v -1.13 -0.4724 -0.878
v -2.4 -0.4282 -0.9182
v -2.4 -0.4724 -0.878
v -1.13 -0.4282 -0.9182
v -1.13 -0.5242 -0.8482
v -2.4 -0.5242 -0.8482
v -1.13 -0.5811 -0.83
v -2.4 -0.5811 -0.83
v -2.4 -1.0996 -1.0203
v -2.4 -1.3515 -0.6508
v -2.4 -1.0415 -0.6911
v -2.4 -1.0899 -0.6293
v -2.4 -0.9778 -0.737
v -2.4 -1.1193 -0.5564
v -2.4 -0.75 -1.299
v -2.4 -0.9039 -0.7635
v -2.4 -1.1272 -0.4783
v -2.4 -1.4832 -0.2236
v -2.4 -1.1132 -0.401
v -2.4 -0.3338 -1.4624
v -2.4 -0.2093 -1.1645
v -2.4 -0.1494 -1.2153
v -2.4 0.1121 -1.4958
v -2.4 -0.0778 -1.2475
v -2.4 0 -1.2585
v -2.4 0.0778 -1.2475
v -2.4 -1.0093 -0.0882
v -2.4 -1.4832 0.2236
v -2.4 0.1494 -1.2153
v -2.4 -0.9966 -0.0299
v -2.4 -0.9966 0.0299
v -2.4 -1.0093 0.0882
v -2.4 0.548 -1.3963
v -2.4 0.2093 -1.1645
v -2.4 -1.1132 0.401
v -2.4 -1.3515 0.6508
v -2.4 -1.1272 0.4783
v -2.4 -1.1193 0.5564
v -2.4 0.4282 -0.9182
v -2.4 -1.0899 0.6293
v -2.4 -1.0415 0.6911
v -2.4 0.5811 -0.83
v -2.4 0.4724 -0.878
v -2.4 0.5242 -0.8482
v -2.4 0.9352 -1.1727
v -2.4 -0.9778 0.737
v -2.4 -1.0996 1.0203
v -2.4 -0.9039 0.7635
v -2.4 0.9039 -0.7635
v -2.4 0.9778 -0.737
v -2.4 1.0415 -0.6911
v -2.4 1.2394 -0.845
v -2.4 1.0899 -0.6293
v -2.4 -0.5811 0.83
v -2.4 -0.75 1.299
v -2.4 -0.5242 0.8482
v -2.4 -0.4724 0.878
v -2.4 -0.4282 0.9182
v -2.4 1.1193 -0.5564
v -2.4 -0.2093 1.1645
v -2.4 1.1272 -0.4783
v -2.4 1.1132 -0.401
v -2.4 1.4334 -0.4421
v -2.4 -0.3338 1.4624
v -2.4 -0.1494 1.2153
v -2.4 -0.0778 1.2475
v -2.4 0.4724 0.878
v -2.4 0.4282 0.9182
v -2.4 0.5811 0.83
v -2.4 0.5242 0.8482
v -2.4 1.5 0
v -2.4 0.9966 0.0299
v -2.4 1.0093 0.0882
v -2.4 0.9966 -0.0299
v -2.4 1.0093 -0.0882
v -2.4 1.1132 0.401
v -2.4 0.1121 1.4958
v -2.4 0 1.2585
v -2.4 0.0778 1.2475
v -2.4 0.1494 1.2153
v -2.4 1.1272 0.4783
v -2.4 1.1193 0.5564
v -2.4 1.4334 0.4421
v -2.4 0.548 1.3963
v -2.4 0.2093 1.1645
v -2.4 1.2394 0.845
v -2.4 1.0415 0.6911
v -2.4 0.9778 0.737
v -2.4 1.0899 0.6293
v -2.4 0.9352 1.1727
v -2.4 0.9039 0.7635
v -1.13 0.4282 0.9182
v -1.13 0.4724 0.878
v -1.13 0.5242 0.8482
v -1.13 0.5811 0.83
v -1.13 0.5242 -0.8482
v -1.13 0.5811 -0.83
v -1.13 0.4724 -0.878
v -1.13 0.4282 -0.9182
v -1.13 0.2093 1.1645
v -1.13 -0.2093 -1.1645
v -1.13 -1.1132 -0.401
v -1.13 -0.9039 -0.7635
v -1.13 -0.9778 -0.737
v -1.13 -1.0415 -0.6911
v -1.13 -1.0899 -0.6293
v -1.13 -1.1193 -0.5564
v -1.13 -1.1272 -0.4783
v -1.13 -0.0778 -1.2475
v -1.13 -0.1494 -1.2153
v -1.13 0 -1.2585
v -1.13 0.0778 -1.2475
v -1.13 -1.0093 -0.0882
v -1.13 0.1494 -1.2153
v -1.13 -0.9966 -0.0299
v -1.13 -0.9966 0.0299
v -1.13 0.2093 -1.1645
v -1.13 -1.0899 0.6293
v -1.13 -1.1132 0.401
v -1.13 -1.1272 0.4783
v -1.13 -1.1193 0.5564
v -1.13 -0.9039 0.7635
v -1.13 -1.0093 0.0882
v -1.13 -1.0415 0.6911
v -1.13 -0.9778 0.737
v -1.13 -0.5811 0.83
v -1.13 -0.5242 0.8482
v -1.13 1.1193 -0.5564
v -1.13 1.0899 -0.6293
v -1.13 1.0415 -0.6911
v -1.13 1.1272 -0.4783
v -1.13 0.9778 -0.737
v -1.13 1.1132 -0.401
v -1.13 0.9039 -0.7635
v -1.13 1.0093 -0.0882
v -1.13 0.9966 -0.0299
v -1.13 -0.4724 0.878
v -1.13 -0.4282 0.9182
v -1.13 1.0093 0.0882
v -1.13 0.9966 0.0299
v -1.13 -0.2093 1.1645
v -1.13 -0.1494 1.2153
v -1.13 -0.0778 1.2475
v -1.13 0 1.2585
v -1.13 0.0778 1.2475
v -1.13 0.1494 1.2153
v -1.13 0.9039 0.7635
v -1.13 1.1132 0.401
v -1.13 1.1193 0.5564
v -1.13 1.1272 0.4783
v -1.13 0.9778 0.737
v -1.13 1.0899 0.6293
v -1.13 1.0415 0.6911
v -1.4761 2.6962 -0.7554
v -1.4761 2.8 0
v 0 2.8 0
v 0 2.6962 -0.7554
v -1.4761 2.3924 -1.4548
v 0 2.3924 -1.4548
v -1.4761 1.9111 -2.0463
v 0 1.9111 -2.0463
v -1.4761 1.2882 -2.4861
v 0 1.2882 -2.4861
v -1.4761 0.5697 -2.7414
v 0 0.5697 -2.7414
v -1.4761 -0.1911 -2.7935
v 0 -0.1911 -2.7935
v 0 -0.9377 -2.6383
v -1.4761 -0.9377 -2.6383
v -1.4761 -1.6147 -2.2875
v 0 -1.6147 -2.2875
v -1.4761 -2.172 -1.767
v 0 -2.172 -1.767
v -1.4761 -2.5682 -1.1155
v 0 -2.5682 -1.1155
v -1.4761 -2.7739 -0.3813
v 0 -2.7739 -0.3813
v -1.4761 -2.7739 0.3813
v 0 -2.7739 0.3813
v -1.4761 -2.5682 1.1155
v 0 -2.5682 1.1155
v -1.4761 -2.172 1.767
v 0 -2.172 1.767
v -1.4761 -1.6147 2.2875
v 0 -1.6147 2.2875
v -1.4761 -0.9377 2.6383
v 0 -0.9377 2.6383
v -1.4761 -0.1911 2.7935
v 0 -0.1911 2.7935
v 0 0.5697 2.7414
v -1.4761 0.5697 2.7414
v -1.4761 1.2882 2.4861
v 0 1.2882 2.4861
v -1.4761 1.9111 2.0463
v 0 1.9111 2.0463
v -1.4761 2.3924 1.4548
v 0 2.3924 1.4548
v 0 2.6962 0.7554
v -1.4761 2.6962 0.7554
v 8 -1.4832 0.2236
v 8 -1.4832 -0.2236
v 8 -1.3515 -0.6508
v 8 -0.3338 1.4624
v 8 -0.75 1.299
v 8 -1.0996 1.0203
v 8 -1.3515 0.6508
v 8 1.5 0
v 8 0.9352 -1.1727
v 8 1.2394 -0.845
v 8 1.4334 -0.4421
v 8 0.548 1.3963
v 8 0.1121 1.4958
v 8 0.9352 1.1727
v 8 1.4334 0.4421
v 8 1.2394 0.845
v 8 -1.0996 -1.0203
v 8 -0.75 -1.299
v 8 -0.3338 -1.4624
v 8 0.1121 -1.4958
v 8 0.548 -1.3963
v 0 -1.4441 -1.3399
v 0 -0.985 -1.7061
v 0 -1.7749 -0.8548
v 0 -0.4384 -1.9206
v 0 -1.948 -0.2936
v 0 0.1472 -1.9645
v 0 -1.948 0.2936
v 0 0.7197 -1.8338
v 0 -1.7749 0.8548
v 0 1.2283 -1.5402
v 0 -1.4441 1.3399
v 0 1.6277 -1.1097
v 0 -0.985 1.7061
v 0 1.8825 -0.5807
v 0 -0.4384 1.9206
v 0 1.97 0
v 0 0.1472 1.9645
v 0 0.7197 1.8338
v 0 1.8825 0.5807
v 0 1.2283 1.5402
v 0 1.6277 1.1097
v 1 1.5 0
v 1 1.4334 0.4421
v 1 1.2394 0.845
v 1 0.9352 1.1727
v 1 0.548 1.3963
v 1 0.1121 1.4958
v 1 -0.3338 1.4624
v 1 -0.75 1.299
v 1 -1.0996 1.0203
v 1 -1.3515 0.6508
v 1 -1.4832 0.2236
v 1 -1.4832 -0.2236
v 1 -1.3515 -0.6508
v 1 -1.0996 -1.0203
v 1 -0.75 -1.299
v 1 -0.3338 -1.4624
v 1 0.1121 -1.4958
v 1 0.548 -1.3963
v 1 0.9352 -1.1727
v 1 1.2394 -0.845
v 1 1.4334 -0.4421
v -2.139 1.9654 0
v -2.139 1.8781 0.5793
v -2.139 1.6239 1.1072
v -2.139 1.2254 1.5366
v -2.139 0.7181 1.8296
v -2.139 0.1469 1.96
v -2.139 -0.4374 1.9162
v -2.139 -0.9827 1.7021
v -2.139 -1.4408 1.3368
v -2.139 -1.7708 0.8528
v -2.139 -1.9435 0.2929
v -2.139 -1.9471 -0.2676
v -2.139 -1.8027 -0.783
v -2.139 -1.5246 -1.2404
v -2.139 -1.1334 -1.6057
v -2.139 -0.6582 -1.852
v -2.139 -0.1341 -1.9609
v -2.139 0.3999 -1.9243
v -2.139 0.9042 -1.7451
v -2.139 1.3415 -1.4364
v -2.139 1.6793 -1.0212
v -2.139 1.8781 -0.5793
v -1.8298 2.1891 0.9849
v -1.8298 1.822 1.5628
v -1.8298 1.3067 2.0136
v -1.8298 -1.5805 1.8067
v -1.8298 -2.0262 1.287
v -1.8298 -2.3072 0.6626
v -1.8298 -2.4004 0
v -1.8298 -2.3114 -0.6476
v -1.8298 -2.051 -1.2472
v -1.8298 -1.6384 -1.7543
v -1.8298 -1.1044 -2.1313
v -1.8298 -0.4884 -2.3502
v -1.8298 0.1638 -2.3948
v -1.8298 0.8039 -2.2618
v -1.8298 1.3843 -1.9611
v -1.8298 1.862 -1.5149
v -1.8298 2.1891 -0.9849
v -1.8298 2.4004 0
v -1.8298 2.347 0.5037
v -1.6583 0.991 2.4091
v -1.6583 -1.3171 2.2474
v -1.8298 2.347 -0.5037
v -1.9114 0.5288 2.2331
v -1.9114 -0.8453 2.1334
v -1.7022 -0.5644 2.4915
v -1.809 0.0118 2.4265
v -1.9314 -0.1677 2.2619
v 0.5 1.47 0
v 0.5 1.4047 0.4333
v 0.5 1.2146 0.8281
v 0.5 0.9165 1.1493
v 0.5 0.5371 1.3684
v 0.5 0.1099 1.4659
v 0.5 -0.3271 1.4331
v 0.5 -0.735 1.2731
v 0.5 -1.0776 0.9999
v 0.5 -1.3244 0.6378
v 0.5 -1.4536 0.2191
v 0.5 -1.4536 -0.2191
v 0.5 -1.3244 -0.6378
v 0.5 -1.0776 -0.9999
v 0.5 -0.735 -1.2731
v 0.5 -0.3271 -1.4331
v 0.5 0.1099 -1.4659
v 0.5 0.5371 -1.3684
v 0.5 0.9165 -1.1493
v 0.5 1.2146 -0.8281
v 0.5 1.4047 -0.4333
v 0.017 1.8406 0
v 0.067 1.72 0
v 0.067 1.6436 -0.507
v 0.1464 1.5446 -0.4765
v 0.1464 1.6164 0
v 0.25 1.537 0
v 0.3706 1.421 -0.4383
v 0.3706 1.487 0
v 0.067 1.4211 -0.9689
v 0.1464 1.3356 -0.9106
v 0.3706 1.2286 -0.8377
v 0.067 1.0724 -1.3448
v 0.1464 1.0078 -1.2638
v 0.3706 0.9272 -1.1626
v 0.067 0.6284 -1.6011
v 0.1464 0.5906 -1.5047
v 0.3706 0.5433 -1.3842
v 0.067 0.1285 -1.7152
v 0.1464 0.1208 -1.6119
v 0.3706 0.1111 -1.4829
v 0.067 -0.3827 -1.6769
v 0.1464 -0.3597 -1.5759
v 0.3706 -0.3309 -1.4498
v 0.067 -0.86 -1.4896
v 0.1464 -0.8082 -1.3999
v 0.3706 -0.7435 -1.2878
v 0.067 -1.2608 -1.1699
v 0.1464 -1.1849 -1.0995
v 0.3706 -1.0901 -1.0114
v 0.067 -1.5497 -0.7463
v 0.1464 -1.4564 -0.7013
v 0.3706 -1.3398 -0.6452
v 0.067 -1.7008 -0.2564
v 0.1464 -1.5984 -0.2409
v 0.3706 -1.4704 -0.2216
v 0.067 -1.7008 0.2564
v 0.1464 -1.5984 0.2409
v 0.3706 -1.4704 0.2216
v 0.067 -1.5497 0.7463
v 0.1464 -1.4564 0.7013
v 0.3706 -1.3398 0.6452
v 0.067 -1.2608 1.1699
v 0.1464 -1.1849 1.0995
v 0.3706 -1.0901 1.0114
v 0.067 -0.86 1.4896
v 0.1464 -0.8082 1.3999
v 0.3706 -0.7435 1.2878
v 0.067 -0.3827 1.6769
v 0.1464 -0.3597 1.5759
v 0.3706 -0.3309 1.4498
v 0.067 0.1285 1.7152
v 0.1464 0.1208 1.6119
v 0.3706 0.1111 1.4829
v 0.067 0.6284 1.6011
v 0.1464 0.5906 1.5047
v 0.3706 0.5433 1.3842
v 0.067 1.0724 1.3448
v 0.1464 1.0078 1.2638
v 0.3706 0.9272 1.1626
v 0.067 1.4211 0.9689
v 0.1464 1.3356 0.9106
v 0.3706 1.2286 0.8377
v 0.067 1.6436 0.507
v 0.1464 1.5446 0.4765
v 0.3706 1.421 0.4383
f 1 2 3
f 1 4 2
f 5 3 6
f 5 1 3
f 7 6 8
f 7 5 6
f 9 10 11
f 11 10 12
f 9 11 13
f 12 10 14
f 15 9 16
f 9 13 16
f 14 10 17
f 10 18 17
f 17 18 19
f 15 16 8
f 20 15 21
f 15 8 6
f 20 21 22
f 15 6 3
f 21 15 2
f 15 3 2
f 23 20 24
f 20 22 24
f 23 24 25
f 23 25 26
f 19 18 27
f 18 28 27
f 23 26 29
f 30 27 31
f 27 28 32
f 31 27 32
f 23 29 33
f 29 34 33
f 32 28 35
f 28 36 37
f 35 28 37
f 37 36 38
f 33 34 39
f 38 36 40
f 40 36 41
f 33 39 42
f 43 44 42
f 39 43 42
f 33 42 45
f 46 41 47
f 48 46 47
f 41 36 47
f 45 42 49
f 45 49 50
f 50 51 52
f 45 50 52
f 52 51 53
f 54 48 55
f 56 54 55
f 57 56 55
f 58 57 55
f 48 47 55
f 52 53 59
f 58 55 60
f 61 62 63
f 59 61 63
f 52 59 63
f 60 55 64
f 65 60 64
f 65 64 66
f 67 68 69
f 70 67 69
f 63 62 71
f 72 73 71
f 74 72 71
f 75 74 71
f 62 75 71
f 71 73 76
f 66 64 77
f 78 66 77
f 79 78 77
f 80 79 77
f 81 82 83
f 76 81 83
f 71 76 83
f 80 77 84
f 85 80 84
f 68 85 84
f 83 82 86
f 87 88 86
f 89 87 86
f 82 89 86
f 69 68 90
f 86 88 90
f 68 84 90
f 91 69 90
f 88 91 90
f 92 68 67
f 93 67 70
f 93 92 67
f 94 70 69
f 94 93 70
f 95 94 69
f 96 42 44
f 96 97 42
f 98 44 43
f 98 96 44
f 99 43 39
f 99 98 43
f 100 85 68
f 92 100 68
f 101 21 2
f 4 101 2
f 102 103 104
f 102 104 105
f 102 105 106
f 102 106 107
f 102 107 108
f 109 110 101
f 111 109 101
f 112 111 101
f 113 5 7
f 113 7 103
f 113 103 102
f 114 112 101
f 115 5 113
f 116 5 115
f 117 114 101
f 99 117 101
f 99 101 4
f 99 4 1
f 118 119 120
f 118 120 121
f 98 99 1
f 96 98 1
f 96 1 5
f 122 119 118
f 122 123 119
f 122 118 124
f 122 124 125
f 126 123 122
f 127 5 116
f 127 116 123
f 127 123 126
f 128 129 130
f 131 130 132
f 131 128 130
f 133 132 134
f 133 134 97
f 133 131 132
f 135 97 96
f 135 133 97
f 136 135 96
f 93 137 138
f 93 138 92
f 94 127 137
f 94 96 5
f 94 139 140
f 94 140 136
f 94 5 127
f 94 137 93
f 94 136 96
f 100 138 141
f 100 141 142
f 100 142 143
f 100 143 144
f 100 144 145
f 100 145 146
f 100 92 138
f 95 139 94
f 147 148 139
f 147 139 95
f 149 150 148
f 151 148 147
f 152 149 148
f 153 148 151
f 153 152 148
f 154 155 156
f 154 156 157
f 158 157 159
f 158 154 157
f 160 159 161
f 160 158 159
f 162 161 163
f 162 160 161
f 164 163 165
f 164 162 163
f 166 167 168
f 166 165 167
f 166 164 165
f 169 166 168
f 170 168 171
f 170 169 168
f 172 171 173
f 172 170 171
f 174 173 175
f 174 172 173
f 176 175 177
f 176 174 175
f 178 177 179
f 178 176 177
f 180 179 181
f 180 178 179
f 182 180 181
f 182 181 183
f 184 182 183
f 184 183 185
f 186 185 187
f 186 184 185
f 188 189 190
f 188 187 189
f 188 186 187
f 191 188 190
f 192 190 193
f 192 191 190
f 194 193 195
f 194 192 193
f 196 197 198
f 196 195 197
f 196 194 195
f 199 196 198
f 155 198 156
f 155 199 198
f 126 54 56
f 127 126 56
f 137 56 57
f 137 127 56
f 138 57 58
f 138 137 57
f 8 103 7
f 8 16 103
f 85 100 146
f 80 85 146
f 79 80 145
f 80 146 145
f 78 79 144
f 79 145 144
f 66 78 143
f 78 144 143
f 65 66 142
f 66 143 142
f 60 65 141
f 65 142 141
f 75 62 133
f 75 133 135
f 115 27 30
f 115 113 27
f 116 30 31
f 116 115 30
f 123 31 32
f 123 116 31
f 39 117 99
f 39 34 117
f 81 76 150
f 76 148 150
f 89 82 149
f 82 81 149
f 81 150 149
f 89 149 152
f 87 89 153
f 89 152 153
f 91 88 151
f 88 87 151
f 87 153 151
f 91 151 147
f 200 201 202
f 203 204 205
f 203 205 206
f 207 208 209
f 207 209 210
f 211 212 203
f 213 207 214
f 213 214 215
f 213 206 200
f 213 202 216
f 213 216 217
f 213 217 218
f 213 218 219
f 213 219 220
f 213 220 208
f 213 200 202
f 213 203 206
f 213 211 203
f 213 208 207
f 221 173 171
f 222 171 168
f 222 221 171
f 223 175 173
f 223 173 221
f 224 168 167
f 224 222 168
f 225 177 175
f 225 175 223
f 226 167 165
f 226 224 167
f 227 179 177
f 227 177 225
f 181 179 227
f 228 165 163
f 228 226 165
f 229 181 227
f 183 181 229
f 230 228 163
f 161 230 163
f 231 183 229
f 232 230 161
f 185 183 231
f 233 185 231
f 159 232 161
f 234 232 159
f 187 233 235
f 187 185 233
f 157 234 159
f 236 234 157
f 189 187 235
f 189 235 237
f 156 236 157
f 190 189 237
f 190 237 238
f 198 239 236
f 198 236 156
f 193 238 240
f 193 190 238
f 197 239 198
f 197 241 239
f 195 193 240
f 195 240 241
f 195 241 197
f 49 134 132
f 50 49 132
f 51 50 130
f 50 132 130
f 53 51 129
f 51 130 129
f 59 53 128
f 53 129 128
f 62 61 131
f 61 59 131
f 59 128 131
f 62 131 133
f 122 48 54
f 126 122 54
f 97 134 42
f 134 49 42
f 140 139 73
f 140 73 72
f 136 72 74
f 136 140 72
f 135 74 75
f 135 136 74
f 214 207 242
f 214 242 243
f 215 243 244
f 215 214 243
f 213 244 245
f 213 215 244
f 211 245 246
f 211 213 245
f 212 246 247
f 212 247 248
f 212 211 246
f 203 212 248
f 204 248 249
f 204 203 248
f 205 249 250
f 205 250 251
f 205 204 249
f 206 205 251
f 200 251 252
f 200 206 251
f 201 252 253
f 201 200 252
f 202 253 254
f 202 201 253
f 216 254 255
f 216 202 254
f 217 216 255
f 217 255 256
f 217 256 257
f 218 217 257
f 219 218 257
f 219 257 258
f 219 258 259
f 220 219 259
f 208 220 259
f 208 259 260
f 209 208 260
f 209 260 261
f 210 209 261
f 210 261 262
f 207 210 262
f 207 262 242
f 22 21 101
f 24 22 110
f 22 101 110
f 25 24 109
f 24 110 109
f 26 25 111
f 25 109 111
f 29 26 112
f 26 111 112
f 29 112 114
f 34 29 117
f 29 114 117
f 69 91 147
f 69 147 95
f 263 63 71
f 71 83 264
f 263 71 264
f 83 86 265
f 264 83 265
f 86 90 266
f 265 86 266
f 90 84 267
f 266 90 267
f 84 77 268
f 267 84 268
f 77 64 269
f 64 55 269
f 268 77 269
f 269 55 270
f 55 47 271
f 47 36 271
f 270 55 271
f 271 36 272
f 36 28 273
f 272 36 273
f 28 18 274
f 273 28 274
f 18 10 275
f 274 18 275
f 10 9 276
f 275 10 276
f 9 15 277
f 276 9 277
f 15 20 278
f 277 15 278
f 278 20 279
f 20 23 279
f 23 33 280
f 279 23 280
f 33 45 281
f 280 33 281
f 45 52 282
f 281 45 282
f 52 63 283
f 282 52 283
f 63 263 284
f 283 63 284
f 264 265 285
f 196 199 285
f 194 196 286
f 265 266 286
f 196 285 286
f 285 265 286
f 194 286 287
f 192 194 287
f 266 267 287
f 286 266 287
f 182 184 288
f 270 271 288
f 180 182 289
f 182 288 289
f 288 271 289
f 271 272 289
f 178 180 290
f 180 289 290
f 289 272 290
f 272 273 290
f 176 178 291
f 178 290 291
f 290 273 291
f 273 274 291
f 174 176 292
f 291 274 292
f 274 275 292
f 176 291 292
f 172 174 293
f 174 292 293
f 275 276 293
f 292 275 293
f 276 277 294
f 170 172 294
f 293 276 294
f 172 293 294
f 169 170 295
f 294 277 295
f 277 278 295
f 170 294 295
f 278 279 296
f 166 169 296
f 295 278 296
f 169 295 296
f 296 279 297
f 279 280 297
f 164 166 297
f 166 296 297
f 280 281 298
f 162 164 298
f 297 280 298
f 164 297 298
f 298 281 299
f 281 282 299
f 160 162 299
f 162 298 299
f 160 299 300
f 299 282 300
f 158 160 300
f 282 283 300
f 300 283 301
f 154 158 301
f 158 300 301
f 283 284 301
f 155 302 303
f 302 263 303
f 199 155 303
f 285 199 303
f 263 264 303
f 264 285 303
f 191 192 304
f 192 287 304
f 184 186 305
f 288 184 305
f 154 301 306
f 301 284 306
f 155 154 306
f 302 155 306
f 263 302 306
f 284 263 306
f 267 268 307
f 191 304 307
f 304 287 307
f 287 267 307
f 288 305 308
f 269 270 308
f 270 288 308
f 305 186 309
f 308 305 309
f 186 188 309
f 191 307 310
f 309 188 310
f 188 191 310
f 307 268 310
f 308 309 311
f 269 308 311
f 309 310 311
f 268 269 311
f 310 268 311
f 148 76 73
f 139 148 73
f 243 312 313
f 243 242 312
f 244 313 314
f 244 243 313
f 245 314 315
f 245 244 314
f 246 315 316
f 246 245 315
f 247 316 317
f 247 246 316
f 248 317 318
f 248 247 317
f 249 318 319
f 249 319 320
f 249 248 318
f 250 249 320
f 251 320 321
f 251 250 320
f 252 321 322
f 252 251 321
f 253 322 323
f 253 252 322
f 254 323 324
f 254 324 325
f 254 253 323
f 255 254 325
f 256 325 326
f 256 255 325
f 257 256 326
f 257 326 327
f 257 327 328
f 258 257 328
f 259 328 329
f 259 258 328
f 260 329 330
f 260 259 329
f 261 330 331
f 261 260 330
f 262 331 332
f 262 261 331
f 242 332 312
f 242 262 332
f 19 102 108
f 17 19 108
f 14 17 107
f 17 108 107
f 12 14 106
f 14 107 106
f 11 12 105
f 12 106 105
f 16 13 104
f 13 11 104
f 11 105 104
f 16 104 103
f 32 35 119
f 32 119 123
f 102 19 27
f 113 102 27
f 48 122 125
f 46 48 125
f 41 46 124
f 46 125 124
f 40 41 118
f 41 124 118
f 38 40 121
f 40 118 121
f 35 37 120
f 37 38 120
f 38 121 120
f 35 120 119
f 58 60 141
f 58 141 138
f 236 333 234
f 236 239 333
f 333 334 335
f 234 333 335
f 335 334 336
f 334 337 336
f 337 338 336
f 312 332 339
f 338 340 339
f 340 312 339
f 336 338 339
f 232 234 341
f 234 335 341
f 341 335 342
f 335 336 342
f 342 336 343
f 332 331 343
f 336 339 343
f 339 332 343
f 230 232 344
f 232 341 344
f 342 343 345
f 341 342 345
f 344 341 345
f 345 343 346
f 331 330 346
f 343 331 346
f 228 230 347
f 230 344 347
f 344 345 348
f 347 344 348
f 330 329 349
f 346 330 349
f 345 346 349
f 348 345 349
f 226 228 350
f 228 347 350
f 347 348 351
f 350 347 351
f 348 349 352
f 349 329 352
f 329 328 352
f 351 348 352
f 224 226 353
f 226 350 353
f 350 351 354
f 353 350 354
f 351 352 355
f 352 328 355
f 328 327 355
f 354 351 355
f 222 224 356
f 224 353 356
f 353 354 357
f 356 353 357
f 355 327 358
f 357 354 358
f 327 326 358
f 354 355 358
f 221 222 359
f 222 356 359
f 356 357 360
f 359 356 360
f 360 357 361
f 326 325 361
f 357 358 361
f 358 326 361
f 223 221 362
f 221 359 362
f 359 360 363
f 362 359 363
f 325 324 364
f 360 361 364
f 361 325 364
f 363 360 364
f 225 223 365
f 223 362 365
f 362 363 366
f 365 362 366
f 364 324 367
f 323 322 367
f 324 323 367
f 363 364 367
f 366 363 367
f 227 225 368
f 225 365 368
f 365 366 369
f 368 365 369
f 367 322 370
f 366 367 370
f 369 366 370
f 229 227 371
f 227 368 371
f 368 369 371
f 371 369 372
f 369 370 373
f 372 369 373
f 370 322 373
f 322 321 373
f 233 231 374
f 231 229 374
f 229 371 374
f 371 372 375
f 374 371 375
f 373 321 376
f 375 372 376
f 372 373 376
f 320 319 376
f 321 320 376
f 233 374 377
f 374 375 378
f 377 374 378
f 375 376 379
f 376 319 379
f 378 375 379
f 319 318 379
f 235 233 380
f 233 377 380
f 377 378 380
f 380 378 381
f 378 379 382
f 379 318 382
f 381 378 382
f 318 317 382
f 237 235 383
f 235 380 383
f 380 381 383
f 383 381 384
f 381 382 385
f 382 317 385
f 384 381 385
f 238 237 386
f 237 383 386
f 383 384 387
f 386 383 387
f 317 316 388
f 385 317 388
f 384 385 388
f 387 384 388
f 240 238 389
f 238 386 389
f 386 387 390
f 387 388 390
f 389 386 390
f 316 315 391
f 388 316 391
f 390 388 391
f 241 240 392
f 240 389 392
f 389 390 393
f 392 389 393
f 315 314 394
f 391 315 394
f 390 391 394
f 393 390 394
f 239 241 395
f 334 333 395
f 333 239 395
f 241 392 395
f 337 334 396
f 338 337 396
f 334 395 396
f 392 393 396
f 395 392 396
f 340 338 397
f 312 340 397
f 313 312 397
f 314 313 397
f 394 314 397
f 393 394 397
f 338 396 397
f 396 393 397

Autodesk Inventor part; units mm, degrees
ref_plane "YZ Plane" through (0, 0, 0) normal (1, 0, 0) x (0, 1, 0)
ref_plane "XZ Plane" through (0, 0, 0) normal (0, 1, 0) x (-1, 0, 0)
ref_plane "XY Plane" through (0, 0, 0) normal (0, 0, 1) x (1, 0, 0)
sketch "Sketch4" plane through (0, 0, 0) normal (0, 0, 1) x (1, 0, 0)
  line L0 (-2.4, 0) -> (8, 0)
  line L1 (0, 0) -> (-2.4, 0)
  line L2 (0, 2.8) -> (0, 1.97)
  line L3 (0.5, 1.47) -> (0.5, 1.47)
  line L4 (0.5, 1.47) -> (1, 1.5)
  arc A0 (0, 1.97) -> (0.5, 1.47) centre (0.5, 1.97) ccw
  line L5 (-2.4, 0) -> (-2.4, 1.5)
  line L6 (0, 2.8) -> (-1.4761, 2.8)
  arc A1 (-1.4761, 2.8) -> (-2.4, 1.5) centre (2.0854, -0.7093) ccw
  line L7 (1, 1.5) -> (8, 1.5)
  line L8 (8, 1.5) -> (8, 0)
  point P0 (0, 1.47)
  dimension "d71" = 0.5
  dimension "d72" = 8
  dimension "d74" = 0.5
  dimension "d75" = 2.94
  dimension "d78" = 3
  dimension "d82" = 5
  dimension "d83" = 2.4
  dimension "d84" = 5.6
  dimension "d104" = 7
  dimension "d105" = 3
revolve "Revolution7" add sketch "Sketch4" angle 360 about axis through (-2.4, 0, 0) along (1, 0, 0)
sketch "Sketch5" plane through (-2.4, 0, 0) normal (-1, 0, 0) x (0, 0, 1)
  circle A0 centre (0, 0) radius 1.4 construction
  circle A1 centre (0, 0) radius 0.98 construction
  line L0 (0, 0) -> (-0.8487, 0.49)
  line L1 (0, 0) -> (-0.8487, -0.49)
  line L2 (-1.8008, 0) -> (1.7887, 0)
  line L3 (-1.4, 0) -> (-0.8487, -0.49)
  line L4 (-1.4, 0) -> (-0.8487, 0.49)
  point P0 (0, 0)
  dimension "d88" = 2.8
  dimension "d89" = 1.96
  dimension "d90" = 30
  dimension "d91" = 30
extrude "Extrusion1" cut sketch "Sketch5" against normal blind 1.27
pattern_circular "Circular Pattern1" count 6 over 360 about axis through (-10, 0, 0) along (1, 0, 0) of "Extrusion1"
fillet "Fillet1" radius 0.28 12 edges at (-1.765, -1.2124, -0.7) (-1.765, -0.49, -0.8487) (-1.765, -0.98, 0) (-1.765, -1.2124, 0.7) (-1.765, -0.49, 0.8487) (-1.765, 0, 1.4) (-1.765, 0.98, 0) (-1.765, 1.2124, 0.7) (-1.765, 0.49, 0.8487) (-1.765, 0.49, -0.8487) (-1.765, 0, -1.4) (-1.765, 1.2124, -0.7)
thread "Thread7" size "M3x0.5" class "6g" standard "ISO Metric profile" length 7
properties part number "Šroub s válcovou hlavou a šestiramennou drážkou ISO 14583 - M3 x 8 - 4.8" material "Ocel"
